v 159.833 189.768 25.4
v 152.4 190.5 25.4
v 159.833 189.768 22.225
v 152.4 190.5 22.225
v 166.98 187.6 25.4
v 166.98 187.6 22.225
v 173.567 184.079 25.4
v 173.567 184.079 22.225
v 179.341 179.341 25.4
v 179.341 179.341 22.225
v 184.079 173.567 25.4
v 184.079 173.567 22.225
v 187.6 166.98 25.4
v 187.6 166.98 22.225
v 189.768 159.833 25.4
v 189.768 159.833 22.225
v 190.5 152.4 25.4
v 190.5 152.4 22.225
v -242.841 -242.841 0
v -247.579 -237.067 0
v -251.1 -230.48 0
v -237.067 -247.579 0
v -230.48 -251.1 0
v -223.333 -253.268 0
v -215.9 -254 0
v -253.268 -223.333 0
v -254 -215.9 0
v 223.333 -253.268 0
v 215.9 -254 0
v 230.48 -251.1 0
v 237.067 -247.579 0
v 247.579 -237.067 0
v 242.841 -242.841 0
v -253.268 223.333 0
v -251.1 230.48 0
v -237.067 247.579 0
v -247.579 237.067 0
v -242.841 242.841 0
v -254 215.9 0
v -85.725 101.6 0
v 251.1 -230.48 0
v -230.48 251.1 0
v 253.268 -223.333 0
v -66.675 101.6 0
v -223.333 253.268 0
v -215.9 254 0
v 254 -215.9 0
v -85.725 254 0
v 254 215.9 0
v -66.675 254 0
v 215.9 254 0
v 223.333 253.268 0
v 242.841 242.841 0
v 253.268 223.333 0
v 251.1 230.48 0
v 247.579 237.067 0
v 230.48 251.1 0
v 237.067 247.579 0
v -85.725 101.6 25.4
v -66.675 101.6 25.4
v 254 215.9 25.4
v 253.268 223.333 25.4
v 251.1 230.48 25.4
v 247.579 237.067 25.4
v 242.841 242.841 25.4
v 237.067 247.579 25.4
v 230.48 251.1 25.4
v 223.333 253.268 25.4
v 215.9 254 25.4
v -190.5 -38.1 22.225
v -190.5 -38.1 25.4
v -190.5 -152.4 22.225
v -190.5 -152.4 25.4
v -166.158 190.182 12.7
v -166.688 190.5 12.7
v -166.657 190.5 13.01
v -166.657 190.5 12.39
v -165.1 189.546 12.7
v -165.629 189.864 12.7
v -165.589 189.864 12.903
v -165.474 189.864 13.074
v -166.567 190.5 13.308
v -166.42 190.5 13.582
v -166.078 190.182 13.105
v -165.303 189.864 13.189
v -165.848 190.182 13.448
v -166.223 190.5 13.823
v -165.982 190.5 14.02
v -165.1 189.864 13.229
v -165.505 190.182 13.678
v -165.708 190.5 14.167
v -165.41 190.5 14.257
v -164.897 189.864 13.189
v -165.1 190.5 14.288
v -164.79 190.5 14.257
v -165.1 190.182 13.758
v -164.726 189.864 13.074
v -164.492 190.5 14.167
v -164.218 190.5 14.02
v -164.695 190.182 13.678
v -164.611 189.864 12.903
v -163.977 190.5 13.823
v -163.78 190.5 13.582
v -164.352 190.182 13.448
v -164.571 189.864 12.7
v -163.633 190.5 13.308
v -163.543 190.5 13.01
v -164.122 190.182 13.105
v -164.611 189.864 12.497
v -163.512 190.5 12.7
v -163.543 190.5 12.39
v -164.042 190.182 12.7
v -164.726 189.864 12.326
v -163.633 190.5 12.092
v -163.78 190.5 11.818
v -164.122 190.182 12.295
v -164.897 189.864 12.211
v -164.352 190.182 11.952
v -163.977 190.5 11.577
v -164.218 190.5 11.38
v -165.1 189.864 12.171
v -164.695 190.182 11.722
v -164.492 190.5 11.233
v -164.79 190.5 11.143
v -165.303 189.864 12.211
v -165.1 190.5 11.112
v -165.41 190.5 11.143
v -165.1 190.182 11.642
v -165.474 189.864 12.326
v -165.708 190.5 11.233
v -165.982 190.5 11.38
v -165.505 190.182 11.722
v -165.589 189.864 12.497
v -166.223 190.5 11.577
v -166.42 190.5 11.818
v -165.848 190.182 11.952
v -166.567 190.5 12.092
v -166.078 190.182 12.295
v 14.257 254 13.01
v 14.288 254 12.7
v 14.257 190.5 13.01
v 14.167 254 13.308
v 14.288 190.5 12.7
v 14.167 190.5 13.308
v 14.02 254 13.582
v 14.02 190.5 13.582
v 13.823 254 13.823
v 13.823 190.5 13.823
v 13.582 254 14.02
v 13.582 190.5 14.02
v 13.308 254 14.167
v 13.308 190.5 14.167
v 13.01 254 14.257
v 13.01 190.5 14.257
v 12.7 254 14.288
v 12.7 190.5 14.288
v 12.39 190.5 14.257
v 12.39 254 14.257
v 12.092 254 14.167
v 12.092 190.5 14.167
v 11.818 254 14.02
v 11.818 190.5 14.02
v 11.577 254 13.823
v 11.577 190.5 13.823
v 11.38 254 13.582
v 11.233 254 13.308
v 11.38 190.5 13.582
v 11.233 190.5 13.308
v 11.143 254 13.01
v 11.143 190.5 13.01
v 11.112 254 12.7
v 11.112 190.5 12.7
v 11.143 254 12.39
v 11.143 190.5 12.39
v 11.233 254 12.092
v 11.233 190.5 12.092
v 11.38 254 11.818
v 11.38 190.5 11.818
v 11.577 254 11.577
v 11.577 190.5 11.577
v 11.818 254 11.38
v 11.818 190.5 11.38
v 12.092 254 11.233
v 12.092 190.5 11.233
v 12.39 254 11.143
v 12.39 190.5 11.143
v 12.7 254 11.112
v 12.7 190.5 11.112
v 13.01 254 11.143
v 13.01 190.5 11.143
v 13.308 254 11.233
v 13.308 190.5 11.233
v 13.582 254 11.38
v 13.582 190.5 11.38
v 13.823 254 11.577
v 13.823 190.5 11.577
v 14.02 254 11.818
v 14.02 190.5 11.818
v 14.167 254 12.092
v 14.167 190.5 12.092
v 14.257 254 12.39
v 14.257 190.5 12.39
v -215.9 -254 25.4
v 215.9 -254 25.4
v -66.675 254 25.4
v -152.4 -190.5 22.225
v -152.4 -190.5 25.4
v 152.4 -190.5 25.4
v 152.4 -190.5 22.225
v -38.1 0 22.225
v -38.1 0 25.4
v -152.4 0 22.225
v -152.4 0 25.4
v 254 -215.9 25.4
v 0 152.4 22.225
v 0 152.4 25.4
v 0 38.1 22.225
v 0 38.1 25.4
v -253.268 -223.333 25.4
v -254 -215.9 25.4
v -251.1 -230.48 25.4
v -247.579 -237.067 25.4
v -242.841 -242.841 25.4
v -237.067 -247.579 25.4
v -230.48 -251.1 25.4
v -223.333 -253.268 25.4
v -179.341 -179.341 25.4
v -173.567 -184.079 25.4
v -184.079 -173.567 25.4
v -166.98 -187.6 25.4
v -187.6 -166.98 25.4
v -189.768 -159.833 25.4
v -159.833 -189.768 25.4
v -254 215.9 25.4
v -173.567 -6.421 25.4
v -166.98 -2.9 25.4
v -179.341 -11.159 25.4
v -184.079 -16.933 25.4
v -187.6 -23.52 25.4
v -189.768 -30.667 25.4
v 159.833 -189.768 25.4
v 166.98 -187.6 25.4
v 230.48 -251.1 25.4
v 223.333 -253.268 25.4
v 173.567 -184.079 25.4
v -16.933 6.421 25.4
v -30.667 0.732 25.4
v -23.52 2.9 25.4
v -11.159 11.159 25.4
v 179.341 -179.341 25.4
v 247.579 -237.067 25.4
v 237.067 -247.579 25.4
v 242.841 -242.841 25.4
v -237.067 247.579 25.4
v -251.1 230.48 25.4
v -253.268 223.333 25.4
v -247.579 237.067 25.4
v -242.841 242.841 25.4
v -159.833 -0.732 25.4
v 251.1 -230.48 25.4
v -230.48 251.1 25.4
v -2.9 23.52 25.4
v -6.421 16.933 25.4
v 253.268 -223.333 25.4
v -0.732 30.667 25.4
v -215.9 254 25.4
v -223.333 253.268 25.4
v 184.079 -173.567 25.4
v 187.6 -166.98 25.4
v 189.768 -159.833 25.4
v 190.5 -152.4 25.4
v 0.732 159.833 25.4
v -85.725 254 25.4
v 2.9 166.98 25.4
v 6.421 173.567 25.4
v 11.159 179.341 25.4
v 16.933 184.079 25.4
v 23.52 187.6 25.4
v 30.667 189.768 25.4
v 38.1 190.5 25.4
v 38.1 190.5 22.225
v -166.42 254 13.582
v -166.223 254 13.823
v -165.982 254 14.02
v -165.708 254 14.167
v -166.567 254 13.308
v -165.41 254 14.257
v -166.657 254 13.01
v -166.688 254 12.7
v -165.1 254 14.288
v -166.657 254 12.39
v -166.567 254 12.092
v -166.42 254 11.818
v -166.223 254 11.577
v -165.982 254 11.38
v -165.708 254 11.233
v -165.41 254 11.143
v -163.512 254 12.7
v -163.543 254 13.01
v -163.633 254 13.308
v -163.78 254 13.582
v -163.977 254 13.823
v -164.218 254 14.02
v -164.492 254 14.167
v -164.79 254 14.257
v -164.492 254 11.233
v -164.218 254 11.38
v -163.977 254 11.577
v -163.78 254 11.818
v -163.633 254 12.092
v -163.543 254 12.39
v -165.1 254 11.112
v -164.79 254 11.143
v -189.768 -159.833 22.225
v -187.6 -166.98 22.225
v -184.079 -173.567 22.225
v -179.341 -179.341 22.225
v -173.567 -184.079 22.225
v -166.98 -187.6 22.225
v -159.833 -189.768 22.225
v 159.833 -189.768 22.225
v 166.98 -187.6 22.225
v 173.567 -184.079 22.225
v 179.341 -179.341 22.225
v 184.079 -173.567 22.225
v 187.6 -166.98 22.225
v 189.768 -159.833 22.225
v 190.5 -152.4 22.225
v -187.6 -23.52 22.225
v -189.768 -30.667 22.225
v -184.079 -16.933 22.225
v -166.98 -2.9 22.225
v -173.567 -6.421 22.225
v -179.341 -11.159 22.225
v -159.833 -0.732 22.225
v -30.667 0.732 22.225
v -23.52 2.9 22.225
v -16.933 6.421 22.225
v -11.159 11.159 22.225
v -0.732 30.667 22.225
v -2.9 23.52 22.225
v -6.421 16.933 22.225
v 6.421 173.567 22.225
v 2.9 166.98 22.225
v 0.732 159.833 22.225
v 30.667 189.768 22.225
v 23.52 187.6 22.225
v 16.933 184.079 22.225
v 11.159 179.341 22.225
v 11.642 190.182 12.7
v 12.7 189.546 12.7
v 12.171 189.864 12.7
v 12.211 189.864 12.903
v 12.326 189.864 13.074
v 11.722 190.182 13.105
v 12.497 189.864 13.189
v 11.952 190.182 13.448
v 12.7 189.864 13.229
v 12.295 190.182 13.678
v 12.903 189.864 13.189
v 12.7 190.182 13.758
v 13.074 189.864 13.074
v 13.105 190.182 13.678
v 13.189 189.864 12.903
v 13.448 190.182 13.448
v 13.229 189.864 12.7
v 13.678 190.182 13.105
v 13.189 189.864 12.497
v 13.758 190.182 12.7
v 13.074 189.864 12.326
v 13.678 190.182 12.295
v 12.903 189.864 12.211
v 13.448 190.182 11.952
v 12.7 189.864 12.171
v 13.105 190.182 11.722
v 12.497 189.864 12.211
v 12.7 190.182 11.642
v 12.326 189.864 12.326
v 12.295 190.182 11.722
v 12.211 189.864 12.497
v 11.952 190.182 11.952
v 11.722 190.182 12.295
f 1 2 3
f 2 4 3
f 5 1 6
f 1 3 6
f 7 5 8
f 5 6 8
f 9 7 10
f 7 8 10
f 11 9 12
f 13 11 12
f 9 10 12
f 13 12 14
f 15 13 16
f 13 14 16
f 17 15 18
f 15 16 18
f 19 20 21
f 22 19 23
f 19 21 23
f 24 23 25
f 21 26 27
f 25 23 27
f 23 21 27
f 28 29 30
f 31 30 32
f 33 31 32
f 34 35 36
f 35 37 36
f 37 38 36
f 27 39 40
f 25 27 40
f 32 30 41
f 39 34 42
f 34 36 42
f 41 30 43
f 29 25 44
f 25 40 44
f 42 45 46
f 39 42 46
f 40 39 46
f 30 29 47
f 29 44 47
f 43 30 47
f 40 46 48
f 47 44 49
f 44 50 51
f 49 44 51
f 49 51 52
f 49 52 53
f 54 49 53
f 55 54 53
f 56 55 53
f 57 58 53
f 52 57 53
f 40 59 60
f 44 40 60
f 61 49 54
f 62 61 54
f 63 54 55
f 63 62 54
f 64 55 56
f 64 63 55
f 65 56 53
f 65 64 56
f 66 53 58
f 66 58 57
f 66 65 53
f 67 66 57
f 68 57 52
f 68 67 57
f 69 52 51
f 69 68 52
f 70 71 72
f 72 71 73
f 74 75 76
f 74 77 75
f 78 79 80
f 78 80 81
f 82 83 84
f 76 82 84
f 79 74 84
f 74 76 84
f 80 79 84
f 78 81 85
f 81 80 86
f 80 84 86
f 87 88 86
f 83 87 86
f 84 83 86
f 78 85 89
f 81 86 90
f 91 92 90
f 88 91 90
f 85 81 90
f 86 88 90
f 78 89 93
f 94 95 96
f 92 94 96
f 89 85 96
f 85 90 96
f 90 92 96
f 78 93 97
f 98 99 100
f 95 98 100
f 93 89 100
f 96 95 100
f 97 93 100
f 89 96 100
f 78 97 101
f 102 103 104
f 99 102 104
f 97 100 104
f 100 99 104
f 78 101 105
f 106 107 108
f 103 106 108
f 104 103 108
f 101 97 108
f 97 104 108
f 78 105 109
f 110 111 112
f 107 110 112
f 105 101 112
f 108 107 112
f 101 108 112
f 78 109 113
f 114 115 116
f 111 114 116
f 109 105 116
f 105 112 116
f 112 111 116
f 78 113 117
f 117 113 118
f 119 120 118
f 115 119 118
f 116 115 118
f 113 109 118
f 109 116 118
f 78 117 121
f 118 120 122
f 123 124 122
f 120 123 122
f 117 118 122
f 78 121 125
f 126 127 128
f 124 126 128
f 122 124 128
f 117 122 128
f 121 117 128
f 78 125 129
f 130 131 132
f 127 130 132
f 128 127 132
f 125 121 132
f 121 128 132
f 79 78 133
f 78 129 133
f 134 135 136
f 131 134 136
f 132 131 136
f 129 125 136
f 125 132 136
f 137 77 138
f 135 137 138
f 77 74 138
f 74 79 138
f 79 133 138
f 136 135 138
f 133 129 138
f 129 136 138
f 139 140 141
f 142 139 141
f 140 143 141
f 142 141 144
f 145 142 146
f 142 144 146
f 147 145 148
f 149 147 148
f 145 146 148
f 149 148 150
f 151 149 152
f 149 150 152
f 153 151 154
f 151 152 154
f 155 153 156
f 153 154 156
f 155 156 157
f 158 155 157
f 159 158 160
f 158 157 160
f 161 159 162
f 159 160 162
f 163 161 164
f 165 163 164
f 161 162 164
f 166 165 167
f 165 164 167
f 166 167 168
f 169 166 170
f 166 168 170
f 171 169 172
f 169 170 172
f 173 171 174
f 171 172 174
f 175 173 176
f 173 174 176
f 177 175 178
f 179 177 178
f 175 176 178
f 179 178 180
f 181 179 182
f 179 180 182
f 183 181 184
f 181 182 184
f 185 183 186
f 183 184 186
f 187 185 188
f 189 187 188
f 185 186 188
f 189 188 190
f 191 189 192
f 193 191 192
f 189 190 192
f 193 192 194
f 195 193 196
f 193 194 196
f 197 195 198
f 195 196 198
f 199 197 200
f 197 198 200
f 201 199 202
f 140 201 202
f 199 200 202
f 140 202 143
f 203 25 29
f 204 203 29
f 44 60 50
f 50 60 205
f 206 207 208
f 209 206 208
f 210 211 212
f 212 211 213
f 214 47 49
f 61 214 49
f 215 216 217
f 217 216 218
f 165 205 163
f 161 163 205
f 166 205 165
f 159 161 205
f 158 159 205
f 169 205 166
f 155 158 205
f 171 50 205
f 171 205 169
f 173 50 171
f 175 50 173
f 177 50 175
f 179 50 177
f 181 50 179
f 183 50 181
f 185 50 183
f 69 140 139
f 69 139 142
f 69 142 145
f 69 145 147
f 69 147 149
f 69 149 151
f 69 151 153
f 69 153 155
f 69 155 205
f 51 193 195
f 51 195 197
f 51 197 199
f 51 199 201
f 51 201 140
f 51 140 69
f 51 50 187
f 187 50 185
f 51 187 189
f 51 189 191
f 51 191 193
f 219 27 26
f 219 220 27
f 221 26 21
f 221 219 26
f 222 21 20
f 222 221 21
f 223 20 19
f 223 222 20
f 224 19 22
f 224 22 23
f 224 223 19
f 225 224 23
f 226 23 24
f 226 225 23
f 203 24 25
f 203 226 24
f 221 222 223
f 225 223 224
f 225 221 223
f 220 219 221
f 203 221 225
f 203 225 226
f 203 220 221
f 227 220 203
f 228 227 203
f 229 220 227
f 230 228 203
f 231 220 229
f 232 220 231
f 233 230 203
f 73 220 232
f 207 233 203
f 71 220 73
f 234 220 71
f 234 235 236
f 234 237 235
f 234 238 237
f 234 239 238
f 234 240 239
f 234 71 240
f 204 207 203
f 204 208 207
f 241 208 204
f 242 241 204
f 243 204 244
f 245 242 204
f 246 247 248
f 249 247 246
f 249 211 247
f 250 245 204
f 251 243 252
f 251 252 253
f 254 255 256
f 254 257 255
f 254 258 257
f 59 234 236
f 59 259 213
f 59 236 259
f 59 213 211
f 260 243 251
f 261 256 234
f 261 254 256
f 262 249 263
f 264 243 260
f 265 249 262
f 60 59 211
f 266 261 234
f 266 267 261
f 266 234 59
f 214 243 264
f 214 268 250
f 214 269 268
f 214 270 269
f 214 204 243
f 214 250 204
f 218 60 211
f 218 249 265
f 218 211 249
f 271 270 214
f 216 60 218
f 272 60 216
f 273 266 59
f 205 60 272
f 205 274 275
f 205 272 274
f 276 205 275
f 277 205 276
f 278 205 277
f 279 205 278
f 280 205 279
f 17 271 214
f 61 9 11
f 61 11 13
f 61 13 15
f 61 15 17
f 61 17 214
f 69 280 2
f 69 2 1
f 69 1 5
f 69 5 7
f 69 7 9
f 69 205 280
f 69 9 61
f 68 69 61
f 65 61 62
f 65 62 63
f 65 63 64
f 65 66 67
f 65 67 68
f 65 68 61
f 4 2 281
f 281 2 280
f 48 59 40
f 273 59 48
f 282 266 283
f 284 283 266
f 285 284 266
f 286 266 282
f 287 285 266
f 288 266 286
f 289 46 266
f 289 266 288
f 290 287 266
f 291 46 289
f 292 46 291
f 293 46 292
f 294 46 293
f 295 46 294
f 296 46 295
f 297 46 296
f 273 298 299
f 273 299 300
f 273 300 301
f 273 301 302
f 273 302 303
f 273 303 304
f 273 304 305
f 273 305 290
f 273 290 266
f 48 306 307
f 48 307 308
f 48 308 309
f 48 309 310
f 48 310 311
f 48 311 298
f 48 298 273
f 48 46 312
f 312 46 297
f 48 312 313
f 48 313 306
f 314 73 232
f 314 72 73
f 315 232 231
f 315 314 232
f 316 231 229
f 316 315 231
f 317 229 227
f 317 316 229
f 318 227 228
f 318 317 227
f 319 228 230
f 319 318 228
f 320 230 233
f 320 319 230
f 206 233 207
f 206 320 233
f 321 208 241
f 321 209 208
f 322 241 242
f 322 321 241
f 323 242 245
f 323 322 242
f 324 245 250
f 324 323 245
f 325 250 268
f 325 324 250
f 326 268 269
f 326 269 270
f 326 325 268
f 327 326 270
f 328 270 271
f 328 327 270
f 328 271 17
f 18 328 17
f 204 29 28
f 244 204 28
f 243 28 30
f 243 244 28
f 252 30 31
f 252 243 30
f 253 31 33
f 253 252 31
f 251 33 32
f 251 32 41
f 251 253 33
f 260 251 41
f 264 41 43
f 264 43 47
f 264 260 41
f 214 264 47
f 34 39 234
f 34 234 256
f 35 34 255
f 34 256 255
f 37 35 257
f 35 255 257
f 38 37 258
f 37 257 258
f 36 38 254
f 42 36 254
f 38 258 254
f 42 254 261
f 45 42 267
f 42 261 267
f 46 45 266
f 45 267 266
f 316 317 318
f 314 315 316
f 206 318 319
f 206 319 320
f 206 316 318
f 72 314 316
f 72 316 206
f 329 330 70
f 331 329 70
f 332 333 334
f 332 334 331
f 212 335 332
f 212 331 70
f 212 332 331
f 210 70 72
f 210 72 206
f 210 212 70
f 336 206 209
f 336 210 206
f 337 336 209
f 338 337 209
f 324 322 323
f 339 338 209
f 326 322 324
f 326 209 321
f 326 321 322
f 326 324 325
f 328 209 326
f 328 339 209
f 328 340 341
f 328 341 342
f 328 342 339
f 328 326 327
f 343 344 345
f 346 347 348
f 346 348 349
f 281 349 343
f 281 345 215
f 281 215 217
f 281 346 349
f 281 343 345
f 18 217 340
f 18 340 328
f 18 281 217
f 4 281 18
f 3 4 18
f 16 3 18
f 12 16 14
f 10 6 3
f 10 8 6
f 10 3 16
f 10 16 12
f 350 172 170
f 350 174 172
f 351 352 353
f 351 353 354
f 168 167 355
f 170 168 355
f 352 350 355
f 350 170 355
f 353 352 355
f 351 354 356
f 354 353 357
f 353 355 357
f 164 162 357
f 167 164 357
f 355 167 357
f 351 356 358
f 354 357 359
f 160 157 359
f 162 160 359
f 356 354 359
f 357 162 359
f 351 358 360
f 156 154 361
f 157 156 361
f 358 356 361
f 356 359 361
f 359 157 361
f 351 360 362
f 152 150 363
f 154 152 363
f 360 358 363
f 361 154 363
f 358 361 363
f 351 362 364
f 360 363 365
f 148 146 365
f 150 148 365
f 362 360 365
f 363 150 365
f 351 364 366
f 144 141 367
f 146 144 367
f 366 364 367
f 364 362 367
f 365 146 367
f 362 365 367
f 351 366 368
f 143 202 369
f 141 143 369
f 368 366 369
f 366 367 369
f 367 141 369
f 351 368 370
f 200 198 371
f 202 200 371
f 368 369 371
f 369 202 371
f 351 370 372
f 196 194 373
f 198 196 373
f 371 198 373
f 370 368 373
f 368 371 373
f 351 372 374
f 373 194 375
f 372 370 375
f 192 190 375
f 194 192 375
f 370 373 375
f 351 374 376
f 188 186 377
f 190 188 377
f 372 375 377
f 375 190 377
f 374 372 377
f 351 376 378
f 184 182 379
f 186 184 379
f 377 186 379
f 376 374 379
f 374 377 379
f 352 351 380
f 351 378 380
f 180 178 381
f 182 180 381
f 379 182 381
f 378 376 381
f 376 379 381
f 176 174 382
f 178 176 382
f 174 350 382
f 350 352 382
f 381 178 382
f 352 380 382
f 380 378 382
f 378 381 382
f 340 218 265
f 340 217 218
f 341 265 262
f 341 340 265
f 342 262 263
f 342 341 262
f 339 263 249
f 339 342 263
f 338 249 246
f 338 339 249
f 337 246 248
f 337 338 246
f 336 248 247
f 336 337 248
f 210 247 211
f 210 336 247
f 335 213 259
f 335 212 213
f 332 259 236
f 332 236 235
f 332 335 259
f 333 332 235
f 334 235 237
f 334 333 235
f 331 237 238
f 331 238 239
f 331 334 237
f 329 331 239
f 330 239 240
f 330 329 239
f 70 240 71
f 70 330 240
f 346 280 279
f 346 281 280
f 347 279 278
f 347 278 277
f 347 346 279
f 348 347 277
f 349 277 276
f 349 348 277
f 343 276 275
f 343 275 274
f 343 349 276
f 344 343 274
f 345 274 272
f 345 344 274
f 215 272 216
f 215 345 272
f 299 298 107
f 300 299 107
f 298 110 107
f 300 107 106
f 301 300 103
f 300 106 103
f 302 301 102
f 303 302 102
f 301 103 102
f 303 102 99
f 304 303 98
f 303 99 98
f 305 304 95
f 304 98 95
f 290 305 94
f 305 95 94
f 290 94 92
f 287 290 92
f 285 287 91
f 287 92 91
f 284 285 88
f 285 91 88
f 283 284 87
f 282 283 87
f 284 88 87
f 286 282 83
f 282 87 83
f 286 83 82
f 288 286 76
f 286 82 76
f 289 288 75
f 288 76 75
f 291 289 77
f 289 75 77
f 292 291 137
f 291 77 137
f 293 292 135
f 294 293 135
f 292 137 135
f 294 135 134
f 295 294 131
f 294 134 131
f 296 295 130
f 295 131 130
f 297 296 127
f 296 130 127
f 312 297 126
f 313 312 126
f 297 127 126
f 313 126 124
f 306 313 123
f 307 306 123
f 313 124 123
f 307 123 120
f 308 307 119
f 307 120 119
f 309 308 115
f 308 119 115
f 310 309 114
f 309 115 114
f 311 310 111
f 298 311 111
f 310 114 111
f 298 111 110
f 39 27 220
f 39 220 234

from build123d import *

# Parameters (mm, degrees)
F6_W     = 508
F6_H     = 508
F7_DEPTH = 25.4
F8_W     = 19.05
F8_H     = 152.4
F9_DEPTH = 25.4
F0_R     = 38.1
F2_DEPTH = 3.175
F3_R     = 38.1
F5_D     = 3.175
F5_DEPTH = 63.5
F5_TIP   = 0.9538662327


with BuildPart() as f7:
    # F6 (on Top) → F7 (new body)
    with BuildSketch(Plane.XY):
        Rectangle(F6_W, F6_H)
    extrude(amount=F7_DEPTH)

    # F8 (on face) → F9 (cut)
    with BuildSketch(Plane.XY.offset(25.4)):
        with Locations((-76.2, 177.8)):
            Rectangle(F8_W, F8_H)
    extrude(amount=-F9_DEPTH, mode=Mode.SUBTRACT)

    # F0
    f0_edges = [f7.edges().sort_by_distance(p)[0] for p in [
        (254, -254, 12.7),
        (254, 254, 12.7),
        (-254, 254, 12.7),
        (-254, -254, 12.7),
    ]]
    fillet(f0_edges, radius=F0_R)

    # F1 (on face) → F2 (cut)
    with BuildSketch(Plane.XY.offset(25.4)):
        Polygon((190.5, 190.5), (0, 190.5), (0, 0), (-190.5, 0), (-190.5, -190.5), (190.5, -190.5), align=None)
    extrude(amount=-F2_DEPTH, mode=Mode.SUBTRACT)

    # F3
    f3_edges = [f7.edges().sort_by_distance(p)[0] for p in [
        (0, 0, 23.8125),
        (0, 190.5, 23.8125),
        (190.5, 190.5, 23.8125),
        (-190.5, -190.5, 23.8125),
        (190.5, -190.5, 23.8125),
        (-190.5, 0, 23.8125),
    ]]
    fillet(f3_edges, radius=F3_R)

    # F5
    with Locations(Plane(origin=(0, 254, 0), x_dir=(-1, 0, 0), z_dir=(0, 1, 0))):
        with Locations((-12.7, 12.7), (165.1, 12.7)):
            Hole(F5_D / 2, depth=F5_DEPTH)
            with Locations((0, 0, -(F5_DEPTH + F5_TIP / 2))):  # 118° drill point
                Cone(0, F5_D / 2, F5_TIP, mode=Mode.SUBTRACT)


solid = f7.part
